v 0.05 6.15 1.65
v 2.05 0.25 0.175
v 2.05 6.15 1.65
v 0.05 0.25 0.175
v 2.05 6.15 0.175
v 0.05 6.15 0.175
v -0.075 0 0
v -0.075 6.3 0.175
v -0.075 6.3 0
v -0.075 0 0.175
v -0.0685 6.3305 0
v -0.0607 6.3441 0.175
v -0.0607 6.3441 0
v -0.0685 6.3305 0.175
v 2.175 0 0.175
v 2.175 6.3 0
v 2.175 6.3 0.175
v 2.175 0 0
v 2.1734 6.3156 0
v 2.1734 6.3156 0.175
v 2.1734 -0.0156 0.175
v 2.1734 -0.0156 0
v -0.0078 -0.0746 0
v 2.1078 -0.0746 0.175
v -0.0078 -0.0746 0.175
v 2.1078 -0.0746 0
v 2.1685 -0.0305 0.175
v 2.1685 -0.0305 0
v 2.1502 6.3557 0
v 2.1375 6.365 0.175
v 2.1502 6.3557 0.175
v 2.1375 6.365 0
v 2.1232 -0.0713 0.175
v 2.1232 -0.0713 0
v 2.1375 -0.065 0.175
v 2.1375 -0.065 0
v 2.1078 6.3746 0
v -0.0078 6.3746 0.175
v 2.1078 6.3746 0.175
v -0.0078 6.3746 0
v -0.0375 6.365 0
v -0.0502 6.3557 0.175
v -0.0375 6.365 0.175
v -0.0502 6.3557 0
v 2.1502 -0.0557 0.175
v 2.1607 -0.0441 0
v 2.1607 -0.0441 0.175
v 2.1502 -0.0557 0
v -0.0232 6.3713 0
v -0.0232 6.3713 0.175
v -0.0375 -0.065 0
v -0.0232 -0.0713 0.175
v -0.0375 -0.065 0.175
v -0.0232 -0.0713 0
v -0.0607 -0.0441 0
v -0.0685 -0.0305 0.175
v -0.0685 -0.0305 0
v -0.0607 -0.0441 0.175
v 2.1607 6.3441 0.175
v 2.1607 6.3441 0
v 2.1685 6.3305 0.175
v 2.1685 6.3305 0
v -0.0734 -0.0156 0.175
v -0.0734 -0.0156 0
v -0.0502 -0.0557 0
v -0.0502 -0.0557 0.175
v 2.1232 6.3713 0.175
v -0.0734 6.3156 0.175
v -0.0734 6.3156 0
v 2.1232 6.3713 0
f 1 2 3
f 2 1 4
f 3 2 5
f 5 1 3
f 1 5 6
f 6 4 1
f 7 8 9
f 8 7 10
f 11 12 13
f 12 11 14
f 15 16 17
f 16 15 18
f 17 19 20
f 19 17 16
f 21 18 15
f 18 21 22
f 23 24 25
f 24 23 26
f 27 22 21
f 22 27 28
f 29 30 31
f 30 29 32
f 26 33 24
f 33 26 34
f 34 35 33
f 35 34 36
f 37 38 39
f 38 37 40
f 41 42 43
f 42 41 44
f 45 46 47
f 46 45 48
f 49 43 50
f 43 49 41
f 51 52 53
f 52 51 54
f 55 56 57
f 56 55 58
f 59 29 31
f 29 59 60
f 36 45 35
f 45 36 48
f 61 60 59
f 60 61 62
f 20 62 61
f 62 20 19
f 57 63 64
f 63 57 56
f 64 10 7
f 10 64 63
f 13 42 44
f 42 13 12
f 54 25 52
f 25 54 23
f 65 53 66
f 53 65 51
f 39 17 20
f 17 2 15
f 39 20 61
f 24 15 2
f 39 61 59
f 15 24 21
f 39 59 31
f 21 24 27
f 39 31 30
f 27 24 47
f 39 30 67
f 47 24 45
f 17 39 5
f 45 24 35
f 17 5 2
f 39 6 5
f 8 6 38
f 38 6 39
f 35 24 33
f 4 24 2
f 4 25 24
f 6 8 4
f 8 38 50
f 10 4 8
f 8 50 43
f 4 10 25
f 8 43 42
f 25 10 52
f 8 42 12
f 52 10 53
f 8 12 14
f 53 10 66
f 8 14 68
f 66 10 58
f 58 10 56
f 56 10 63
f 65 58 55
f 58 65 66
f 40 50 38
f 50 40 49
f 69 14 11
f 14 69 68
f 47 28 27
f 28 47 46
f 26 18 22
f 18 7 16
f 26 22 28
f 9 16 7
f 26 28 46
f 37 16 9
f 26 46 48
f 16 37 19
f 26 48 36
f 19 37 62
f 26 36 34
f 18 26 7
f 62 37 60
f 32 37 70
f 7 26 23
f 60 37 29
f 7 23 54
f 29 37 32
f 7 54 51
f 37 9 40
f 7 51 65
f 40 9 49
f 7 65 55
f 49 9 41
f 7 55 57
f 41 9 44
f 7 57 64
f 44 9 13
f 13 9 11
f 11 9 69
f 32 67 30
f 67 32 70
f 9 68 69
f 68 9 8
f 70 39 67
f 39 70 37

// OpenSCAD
/**
 * @author Robotia
 * @brief Doorstop
 */

baseborder = 0.05; // Percentage of doorstop length/width base will go over

doorstop = [2, 6, 1.5];

translate([doorstop[0] * baseborder / 2, doorstop[1] * baseborder / 2, doorstop[2] * baseborder * 2])
prism(doorstop[0], doorstop[1], doorstop[2], center=false);

minkowski() {
    cube(size=[doorstop[0]*(1+baseborder), doorstop[1]*(1+baseborder), doorstop[2]*baseborder]);
    cylinder(r=doorstop[2]*baseborder, h=0.1, $fn=30);
}




module prism(l, w, h, center=false){
    if (center == true) {
        translate([- l / 2, - w / 2 - w / 30, 0]) {
            polyhedron(points=[[0,0,0], [l,0,0], [l,w,0], [0,w,0], [0,w,h], [l,w,h]], faces=[[0,1,2,3],[5,4,3,2],[0,4,5,1],[0,3,4],[5,2,1]]);
        }
    } else {
        polyhedron(points=[[0,0,0], [l,0,0], [l,w,0], [0,w,0], [0,w,h], [l,w,h]], faces=[[0,1,2,3],[5,4,3,2],[0,4,5,1],[0,3,4],[5,2,1]]);
    }
}
